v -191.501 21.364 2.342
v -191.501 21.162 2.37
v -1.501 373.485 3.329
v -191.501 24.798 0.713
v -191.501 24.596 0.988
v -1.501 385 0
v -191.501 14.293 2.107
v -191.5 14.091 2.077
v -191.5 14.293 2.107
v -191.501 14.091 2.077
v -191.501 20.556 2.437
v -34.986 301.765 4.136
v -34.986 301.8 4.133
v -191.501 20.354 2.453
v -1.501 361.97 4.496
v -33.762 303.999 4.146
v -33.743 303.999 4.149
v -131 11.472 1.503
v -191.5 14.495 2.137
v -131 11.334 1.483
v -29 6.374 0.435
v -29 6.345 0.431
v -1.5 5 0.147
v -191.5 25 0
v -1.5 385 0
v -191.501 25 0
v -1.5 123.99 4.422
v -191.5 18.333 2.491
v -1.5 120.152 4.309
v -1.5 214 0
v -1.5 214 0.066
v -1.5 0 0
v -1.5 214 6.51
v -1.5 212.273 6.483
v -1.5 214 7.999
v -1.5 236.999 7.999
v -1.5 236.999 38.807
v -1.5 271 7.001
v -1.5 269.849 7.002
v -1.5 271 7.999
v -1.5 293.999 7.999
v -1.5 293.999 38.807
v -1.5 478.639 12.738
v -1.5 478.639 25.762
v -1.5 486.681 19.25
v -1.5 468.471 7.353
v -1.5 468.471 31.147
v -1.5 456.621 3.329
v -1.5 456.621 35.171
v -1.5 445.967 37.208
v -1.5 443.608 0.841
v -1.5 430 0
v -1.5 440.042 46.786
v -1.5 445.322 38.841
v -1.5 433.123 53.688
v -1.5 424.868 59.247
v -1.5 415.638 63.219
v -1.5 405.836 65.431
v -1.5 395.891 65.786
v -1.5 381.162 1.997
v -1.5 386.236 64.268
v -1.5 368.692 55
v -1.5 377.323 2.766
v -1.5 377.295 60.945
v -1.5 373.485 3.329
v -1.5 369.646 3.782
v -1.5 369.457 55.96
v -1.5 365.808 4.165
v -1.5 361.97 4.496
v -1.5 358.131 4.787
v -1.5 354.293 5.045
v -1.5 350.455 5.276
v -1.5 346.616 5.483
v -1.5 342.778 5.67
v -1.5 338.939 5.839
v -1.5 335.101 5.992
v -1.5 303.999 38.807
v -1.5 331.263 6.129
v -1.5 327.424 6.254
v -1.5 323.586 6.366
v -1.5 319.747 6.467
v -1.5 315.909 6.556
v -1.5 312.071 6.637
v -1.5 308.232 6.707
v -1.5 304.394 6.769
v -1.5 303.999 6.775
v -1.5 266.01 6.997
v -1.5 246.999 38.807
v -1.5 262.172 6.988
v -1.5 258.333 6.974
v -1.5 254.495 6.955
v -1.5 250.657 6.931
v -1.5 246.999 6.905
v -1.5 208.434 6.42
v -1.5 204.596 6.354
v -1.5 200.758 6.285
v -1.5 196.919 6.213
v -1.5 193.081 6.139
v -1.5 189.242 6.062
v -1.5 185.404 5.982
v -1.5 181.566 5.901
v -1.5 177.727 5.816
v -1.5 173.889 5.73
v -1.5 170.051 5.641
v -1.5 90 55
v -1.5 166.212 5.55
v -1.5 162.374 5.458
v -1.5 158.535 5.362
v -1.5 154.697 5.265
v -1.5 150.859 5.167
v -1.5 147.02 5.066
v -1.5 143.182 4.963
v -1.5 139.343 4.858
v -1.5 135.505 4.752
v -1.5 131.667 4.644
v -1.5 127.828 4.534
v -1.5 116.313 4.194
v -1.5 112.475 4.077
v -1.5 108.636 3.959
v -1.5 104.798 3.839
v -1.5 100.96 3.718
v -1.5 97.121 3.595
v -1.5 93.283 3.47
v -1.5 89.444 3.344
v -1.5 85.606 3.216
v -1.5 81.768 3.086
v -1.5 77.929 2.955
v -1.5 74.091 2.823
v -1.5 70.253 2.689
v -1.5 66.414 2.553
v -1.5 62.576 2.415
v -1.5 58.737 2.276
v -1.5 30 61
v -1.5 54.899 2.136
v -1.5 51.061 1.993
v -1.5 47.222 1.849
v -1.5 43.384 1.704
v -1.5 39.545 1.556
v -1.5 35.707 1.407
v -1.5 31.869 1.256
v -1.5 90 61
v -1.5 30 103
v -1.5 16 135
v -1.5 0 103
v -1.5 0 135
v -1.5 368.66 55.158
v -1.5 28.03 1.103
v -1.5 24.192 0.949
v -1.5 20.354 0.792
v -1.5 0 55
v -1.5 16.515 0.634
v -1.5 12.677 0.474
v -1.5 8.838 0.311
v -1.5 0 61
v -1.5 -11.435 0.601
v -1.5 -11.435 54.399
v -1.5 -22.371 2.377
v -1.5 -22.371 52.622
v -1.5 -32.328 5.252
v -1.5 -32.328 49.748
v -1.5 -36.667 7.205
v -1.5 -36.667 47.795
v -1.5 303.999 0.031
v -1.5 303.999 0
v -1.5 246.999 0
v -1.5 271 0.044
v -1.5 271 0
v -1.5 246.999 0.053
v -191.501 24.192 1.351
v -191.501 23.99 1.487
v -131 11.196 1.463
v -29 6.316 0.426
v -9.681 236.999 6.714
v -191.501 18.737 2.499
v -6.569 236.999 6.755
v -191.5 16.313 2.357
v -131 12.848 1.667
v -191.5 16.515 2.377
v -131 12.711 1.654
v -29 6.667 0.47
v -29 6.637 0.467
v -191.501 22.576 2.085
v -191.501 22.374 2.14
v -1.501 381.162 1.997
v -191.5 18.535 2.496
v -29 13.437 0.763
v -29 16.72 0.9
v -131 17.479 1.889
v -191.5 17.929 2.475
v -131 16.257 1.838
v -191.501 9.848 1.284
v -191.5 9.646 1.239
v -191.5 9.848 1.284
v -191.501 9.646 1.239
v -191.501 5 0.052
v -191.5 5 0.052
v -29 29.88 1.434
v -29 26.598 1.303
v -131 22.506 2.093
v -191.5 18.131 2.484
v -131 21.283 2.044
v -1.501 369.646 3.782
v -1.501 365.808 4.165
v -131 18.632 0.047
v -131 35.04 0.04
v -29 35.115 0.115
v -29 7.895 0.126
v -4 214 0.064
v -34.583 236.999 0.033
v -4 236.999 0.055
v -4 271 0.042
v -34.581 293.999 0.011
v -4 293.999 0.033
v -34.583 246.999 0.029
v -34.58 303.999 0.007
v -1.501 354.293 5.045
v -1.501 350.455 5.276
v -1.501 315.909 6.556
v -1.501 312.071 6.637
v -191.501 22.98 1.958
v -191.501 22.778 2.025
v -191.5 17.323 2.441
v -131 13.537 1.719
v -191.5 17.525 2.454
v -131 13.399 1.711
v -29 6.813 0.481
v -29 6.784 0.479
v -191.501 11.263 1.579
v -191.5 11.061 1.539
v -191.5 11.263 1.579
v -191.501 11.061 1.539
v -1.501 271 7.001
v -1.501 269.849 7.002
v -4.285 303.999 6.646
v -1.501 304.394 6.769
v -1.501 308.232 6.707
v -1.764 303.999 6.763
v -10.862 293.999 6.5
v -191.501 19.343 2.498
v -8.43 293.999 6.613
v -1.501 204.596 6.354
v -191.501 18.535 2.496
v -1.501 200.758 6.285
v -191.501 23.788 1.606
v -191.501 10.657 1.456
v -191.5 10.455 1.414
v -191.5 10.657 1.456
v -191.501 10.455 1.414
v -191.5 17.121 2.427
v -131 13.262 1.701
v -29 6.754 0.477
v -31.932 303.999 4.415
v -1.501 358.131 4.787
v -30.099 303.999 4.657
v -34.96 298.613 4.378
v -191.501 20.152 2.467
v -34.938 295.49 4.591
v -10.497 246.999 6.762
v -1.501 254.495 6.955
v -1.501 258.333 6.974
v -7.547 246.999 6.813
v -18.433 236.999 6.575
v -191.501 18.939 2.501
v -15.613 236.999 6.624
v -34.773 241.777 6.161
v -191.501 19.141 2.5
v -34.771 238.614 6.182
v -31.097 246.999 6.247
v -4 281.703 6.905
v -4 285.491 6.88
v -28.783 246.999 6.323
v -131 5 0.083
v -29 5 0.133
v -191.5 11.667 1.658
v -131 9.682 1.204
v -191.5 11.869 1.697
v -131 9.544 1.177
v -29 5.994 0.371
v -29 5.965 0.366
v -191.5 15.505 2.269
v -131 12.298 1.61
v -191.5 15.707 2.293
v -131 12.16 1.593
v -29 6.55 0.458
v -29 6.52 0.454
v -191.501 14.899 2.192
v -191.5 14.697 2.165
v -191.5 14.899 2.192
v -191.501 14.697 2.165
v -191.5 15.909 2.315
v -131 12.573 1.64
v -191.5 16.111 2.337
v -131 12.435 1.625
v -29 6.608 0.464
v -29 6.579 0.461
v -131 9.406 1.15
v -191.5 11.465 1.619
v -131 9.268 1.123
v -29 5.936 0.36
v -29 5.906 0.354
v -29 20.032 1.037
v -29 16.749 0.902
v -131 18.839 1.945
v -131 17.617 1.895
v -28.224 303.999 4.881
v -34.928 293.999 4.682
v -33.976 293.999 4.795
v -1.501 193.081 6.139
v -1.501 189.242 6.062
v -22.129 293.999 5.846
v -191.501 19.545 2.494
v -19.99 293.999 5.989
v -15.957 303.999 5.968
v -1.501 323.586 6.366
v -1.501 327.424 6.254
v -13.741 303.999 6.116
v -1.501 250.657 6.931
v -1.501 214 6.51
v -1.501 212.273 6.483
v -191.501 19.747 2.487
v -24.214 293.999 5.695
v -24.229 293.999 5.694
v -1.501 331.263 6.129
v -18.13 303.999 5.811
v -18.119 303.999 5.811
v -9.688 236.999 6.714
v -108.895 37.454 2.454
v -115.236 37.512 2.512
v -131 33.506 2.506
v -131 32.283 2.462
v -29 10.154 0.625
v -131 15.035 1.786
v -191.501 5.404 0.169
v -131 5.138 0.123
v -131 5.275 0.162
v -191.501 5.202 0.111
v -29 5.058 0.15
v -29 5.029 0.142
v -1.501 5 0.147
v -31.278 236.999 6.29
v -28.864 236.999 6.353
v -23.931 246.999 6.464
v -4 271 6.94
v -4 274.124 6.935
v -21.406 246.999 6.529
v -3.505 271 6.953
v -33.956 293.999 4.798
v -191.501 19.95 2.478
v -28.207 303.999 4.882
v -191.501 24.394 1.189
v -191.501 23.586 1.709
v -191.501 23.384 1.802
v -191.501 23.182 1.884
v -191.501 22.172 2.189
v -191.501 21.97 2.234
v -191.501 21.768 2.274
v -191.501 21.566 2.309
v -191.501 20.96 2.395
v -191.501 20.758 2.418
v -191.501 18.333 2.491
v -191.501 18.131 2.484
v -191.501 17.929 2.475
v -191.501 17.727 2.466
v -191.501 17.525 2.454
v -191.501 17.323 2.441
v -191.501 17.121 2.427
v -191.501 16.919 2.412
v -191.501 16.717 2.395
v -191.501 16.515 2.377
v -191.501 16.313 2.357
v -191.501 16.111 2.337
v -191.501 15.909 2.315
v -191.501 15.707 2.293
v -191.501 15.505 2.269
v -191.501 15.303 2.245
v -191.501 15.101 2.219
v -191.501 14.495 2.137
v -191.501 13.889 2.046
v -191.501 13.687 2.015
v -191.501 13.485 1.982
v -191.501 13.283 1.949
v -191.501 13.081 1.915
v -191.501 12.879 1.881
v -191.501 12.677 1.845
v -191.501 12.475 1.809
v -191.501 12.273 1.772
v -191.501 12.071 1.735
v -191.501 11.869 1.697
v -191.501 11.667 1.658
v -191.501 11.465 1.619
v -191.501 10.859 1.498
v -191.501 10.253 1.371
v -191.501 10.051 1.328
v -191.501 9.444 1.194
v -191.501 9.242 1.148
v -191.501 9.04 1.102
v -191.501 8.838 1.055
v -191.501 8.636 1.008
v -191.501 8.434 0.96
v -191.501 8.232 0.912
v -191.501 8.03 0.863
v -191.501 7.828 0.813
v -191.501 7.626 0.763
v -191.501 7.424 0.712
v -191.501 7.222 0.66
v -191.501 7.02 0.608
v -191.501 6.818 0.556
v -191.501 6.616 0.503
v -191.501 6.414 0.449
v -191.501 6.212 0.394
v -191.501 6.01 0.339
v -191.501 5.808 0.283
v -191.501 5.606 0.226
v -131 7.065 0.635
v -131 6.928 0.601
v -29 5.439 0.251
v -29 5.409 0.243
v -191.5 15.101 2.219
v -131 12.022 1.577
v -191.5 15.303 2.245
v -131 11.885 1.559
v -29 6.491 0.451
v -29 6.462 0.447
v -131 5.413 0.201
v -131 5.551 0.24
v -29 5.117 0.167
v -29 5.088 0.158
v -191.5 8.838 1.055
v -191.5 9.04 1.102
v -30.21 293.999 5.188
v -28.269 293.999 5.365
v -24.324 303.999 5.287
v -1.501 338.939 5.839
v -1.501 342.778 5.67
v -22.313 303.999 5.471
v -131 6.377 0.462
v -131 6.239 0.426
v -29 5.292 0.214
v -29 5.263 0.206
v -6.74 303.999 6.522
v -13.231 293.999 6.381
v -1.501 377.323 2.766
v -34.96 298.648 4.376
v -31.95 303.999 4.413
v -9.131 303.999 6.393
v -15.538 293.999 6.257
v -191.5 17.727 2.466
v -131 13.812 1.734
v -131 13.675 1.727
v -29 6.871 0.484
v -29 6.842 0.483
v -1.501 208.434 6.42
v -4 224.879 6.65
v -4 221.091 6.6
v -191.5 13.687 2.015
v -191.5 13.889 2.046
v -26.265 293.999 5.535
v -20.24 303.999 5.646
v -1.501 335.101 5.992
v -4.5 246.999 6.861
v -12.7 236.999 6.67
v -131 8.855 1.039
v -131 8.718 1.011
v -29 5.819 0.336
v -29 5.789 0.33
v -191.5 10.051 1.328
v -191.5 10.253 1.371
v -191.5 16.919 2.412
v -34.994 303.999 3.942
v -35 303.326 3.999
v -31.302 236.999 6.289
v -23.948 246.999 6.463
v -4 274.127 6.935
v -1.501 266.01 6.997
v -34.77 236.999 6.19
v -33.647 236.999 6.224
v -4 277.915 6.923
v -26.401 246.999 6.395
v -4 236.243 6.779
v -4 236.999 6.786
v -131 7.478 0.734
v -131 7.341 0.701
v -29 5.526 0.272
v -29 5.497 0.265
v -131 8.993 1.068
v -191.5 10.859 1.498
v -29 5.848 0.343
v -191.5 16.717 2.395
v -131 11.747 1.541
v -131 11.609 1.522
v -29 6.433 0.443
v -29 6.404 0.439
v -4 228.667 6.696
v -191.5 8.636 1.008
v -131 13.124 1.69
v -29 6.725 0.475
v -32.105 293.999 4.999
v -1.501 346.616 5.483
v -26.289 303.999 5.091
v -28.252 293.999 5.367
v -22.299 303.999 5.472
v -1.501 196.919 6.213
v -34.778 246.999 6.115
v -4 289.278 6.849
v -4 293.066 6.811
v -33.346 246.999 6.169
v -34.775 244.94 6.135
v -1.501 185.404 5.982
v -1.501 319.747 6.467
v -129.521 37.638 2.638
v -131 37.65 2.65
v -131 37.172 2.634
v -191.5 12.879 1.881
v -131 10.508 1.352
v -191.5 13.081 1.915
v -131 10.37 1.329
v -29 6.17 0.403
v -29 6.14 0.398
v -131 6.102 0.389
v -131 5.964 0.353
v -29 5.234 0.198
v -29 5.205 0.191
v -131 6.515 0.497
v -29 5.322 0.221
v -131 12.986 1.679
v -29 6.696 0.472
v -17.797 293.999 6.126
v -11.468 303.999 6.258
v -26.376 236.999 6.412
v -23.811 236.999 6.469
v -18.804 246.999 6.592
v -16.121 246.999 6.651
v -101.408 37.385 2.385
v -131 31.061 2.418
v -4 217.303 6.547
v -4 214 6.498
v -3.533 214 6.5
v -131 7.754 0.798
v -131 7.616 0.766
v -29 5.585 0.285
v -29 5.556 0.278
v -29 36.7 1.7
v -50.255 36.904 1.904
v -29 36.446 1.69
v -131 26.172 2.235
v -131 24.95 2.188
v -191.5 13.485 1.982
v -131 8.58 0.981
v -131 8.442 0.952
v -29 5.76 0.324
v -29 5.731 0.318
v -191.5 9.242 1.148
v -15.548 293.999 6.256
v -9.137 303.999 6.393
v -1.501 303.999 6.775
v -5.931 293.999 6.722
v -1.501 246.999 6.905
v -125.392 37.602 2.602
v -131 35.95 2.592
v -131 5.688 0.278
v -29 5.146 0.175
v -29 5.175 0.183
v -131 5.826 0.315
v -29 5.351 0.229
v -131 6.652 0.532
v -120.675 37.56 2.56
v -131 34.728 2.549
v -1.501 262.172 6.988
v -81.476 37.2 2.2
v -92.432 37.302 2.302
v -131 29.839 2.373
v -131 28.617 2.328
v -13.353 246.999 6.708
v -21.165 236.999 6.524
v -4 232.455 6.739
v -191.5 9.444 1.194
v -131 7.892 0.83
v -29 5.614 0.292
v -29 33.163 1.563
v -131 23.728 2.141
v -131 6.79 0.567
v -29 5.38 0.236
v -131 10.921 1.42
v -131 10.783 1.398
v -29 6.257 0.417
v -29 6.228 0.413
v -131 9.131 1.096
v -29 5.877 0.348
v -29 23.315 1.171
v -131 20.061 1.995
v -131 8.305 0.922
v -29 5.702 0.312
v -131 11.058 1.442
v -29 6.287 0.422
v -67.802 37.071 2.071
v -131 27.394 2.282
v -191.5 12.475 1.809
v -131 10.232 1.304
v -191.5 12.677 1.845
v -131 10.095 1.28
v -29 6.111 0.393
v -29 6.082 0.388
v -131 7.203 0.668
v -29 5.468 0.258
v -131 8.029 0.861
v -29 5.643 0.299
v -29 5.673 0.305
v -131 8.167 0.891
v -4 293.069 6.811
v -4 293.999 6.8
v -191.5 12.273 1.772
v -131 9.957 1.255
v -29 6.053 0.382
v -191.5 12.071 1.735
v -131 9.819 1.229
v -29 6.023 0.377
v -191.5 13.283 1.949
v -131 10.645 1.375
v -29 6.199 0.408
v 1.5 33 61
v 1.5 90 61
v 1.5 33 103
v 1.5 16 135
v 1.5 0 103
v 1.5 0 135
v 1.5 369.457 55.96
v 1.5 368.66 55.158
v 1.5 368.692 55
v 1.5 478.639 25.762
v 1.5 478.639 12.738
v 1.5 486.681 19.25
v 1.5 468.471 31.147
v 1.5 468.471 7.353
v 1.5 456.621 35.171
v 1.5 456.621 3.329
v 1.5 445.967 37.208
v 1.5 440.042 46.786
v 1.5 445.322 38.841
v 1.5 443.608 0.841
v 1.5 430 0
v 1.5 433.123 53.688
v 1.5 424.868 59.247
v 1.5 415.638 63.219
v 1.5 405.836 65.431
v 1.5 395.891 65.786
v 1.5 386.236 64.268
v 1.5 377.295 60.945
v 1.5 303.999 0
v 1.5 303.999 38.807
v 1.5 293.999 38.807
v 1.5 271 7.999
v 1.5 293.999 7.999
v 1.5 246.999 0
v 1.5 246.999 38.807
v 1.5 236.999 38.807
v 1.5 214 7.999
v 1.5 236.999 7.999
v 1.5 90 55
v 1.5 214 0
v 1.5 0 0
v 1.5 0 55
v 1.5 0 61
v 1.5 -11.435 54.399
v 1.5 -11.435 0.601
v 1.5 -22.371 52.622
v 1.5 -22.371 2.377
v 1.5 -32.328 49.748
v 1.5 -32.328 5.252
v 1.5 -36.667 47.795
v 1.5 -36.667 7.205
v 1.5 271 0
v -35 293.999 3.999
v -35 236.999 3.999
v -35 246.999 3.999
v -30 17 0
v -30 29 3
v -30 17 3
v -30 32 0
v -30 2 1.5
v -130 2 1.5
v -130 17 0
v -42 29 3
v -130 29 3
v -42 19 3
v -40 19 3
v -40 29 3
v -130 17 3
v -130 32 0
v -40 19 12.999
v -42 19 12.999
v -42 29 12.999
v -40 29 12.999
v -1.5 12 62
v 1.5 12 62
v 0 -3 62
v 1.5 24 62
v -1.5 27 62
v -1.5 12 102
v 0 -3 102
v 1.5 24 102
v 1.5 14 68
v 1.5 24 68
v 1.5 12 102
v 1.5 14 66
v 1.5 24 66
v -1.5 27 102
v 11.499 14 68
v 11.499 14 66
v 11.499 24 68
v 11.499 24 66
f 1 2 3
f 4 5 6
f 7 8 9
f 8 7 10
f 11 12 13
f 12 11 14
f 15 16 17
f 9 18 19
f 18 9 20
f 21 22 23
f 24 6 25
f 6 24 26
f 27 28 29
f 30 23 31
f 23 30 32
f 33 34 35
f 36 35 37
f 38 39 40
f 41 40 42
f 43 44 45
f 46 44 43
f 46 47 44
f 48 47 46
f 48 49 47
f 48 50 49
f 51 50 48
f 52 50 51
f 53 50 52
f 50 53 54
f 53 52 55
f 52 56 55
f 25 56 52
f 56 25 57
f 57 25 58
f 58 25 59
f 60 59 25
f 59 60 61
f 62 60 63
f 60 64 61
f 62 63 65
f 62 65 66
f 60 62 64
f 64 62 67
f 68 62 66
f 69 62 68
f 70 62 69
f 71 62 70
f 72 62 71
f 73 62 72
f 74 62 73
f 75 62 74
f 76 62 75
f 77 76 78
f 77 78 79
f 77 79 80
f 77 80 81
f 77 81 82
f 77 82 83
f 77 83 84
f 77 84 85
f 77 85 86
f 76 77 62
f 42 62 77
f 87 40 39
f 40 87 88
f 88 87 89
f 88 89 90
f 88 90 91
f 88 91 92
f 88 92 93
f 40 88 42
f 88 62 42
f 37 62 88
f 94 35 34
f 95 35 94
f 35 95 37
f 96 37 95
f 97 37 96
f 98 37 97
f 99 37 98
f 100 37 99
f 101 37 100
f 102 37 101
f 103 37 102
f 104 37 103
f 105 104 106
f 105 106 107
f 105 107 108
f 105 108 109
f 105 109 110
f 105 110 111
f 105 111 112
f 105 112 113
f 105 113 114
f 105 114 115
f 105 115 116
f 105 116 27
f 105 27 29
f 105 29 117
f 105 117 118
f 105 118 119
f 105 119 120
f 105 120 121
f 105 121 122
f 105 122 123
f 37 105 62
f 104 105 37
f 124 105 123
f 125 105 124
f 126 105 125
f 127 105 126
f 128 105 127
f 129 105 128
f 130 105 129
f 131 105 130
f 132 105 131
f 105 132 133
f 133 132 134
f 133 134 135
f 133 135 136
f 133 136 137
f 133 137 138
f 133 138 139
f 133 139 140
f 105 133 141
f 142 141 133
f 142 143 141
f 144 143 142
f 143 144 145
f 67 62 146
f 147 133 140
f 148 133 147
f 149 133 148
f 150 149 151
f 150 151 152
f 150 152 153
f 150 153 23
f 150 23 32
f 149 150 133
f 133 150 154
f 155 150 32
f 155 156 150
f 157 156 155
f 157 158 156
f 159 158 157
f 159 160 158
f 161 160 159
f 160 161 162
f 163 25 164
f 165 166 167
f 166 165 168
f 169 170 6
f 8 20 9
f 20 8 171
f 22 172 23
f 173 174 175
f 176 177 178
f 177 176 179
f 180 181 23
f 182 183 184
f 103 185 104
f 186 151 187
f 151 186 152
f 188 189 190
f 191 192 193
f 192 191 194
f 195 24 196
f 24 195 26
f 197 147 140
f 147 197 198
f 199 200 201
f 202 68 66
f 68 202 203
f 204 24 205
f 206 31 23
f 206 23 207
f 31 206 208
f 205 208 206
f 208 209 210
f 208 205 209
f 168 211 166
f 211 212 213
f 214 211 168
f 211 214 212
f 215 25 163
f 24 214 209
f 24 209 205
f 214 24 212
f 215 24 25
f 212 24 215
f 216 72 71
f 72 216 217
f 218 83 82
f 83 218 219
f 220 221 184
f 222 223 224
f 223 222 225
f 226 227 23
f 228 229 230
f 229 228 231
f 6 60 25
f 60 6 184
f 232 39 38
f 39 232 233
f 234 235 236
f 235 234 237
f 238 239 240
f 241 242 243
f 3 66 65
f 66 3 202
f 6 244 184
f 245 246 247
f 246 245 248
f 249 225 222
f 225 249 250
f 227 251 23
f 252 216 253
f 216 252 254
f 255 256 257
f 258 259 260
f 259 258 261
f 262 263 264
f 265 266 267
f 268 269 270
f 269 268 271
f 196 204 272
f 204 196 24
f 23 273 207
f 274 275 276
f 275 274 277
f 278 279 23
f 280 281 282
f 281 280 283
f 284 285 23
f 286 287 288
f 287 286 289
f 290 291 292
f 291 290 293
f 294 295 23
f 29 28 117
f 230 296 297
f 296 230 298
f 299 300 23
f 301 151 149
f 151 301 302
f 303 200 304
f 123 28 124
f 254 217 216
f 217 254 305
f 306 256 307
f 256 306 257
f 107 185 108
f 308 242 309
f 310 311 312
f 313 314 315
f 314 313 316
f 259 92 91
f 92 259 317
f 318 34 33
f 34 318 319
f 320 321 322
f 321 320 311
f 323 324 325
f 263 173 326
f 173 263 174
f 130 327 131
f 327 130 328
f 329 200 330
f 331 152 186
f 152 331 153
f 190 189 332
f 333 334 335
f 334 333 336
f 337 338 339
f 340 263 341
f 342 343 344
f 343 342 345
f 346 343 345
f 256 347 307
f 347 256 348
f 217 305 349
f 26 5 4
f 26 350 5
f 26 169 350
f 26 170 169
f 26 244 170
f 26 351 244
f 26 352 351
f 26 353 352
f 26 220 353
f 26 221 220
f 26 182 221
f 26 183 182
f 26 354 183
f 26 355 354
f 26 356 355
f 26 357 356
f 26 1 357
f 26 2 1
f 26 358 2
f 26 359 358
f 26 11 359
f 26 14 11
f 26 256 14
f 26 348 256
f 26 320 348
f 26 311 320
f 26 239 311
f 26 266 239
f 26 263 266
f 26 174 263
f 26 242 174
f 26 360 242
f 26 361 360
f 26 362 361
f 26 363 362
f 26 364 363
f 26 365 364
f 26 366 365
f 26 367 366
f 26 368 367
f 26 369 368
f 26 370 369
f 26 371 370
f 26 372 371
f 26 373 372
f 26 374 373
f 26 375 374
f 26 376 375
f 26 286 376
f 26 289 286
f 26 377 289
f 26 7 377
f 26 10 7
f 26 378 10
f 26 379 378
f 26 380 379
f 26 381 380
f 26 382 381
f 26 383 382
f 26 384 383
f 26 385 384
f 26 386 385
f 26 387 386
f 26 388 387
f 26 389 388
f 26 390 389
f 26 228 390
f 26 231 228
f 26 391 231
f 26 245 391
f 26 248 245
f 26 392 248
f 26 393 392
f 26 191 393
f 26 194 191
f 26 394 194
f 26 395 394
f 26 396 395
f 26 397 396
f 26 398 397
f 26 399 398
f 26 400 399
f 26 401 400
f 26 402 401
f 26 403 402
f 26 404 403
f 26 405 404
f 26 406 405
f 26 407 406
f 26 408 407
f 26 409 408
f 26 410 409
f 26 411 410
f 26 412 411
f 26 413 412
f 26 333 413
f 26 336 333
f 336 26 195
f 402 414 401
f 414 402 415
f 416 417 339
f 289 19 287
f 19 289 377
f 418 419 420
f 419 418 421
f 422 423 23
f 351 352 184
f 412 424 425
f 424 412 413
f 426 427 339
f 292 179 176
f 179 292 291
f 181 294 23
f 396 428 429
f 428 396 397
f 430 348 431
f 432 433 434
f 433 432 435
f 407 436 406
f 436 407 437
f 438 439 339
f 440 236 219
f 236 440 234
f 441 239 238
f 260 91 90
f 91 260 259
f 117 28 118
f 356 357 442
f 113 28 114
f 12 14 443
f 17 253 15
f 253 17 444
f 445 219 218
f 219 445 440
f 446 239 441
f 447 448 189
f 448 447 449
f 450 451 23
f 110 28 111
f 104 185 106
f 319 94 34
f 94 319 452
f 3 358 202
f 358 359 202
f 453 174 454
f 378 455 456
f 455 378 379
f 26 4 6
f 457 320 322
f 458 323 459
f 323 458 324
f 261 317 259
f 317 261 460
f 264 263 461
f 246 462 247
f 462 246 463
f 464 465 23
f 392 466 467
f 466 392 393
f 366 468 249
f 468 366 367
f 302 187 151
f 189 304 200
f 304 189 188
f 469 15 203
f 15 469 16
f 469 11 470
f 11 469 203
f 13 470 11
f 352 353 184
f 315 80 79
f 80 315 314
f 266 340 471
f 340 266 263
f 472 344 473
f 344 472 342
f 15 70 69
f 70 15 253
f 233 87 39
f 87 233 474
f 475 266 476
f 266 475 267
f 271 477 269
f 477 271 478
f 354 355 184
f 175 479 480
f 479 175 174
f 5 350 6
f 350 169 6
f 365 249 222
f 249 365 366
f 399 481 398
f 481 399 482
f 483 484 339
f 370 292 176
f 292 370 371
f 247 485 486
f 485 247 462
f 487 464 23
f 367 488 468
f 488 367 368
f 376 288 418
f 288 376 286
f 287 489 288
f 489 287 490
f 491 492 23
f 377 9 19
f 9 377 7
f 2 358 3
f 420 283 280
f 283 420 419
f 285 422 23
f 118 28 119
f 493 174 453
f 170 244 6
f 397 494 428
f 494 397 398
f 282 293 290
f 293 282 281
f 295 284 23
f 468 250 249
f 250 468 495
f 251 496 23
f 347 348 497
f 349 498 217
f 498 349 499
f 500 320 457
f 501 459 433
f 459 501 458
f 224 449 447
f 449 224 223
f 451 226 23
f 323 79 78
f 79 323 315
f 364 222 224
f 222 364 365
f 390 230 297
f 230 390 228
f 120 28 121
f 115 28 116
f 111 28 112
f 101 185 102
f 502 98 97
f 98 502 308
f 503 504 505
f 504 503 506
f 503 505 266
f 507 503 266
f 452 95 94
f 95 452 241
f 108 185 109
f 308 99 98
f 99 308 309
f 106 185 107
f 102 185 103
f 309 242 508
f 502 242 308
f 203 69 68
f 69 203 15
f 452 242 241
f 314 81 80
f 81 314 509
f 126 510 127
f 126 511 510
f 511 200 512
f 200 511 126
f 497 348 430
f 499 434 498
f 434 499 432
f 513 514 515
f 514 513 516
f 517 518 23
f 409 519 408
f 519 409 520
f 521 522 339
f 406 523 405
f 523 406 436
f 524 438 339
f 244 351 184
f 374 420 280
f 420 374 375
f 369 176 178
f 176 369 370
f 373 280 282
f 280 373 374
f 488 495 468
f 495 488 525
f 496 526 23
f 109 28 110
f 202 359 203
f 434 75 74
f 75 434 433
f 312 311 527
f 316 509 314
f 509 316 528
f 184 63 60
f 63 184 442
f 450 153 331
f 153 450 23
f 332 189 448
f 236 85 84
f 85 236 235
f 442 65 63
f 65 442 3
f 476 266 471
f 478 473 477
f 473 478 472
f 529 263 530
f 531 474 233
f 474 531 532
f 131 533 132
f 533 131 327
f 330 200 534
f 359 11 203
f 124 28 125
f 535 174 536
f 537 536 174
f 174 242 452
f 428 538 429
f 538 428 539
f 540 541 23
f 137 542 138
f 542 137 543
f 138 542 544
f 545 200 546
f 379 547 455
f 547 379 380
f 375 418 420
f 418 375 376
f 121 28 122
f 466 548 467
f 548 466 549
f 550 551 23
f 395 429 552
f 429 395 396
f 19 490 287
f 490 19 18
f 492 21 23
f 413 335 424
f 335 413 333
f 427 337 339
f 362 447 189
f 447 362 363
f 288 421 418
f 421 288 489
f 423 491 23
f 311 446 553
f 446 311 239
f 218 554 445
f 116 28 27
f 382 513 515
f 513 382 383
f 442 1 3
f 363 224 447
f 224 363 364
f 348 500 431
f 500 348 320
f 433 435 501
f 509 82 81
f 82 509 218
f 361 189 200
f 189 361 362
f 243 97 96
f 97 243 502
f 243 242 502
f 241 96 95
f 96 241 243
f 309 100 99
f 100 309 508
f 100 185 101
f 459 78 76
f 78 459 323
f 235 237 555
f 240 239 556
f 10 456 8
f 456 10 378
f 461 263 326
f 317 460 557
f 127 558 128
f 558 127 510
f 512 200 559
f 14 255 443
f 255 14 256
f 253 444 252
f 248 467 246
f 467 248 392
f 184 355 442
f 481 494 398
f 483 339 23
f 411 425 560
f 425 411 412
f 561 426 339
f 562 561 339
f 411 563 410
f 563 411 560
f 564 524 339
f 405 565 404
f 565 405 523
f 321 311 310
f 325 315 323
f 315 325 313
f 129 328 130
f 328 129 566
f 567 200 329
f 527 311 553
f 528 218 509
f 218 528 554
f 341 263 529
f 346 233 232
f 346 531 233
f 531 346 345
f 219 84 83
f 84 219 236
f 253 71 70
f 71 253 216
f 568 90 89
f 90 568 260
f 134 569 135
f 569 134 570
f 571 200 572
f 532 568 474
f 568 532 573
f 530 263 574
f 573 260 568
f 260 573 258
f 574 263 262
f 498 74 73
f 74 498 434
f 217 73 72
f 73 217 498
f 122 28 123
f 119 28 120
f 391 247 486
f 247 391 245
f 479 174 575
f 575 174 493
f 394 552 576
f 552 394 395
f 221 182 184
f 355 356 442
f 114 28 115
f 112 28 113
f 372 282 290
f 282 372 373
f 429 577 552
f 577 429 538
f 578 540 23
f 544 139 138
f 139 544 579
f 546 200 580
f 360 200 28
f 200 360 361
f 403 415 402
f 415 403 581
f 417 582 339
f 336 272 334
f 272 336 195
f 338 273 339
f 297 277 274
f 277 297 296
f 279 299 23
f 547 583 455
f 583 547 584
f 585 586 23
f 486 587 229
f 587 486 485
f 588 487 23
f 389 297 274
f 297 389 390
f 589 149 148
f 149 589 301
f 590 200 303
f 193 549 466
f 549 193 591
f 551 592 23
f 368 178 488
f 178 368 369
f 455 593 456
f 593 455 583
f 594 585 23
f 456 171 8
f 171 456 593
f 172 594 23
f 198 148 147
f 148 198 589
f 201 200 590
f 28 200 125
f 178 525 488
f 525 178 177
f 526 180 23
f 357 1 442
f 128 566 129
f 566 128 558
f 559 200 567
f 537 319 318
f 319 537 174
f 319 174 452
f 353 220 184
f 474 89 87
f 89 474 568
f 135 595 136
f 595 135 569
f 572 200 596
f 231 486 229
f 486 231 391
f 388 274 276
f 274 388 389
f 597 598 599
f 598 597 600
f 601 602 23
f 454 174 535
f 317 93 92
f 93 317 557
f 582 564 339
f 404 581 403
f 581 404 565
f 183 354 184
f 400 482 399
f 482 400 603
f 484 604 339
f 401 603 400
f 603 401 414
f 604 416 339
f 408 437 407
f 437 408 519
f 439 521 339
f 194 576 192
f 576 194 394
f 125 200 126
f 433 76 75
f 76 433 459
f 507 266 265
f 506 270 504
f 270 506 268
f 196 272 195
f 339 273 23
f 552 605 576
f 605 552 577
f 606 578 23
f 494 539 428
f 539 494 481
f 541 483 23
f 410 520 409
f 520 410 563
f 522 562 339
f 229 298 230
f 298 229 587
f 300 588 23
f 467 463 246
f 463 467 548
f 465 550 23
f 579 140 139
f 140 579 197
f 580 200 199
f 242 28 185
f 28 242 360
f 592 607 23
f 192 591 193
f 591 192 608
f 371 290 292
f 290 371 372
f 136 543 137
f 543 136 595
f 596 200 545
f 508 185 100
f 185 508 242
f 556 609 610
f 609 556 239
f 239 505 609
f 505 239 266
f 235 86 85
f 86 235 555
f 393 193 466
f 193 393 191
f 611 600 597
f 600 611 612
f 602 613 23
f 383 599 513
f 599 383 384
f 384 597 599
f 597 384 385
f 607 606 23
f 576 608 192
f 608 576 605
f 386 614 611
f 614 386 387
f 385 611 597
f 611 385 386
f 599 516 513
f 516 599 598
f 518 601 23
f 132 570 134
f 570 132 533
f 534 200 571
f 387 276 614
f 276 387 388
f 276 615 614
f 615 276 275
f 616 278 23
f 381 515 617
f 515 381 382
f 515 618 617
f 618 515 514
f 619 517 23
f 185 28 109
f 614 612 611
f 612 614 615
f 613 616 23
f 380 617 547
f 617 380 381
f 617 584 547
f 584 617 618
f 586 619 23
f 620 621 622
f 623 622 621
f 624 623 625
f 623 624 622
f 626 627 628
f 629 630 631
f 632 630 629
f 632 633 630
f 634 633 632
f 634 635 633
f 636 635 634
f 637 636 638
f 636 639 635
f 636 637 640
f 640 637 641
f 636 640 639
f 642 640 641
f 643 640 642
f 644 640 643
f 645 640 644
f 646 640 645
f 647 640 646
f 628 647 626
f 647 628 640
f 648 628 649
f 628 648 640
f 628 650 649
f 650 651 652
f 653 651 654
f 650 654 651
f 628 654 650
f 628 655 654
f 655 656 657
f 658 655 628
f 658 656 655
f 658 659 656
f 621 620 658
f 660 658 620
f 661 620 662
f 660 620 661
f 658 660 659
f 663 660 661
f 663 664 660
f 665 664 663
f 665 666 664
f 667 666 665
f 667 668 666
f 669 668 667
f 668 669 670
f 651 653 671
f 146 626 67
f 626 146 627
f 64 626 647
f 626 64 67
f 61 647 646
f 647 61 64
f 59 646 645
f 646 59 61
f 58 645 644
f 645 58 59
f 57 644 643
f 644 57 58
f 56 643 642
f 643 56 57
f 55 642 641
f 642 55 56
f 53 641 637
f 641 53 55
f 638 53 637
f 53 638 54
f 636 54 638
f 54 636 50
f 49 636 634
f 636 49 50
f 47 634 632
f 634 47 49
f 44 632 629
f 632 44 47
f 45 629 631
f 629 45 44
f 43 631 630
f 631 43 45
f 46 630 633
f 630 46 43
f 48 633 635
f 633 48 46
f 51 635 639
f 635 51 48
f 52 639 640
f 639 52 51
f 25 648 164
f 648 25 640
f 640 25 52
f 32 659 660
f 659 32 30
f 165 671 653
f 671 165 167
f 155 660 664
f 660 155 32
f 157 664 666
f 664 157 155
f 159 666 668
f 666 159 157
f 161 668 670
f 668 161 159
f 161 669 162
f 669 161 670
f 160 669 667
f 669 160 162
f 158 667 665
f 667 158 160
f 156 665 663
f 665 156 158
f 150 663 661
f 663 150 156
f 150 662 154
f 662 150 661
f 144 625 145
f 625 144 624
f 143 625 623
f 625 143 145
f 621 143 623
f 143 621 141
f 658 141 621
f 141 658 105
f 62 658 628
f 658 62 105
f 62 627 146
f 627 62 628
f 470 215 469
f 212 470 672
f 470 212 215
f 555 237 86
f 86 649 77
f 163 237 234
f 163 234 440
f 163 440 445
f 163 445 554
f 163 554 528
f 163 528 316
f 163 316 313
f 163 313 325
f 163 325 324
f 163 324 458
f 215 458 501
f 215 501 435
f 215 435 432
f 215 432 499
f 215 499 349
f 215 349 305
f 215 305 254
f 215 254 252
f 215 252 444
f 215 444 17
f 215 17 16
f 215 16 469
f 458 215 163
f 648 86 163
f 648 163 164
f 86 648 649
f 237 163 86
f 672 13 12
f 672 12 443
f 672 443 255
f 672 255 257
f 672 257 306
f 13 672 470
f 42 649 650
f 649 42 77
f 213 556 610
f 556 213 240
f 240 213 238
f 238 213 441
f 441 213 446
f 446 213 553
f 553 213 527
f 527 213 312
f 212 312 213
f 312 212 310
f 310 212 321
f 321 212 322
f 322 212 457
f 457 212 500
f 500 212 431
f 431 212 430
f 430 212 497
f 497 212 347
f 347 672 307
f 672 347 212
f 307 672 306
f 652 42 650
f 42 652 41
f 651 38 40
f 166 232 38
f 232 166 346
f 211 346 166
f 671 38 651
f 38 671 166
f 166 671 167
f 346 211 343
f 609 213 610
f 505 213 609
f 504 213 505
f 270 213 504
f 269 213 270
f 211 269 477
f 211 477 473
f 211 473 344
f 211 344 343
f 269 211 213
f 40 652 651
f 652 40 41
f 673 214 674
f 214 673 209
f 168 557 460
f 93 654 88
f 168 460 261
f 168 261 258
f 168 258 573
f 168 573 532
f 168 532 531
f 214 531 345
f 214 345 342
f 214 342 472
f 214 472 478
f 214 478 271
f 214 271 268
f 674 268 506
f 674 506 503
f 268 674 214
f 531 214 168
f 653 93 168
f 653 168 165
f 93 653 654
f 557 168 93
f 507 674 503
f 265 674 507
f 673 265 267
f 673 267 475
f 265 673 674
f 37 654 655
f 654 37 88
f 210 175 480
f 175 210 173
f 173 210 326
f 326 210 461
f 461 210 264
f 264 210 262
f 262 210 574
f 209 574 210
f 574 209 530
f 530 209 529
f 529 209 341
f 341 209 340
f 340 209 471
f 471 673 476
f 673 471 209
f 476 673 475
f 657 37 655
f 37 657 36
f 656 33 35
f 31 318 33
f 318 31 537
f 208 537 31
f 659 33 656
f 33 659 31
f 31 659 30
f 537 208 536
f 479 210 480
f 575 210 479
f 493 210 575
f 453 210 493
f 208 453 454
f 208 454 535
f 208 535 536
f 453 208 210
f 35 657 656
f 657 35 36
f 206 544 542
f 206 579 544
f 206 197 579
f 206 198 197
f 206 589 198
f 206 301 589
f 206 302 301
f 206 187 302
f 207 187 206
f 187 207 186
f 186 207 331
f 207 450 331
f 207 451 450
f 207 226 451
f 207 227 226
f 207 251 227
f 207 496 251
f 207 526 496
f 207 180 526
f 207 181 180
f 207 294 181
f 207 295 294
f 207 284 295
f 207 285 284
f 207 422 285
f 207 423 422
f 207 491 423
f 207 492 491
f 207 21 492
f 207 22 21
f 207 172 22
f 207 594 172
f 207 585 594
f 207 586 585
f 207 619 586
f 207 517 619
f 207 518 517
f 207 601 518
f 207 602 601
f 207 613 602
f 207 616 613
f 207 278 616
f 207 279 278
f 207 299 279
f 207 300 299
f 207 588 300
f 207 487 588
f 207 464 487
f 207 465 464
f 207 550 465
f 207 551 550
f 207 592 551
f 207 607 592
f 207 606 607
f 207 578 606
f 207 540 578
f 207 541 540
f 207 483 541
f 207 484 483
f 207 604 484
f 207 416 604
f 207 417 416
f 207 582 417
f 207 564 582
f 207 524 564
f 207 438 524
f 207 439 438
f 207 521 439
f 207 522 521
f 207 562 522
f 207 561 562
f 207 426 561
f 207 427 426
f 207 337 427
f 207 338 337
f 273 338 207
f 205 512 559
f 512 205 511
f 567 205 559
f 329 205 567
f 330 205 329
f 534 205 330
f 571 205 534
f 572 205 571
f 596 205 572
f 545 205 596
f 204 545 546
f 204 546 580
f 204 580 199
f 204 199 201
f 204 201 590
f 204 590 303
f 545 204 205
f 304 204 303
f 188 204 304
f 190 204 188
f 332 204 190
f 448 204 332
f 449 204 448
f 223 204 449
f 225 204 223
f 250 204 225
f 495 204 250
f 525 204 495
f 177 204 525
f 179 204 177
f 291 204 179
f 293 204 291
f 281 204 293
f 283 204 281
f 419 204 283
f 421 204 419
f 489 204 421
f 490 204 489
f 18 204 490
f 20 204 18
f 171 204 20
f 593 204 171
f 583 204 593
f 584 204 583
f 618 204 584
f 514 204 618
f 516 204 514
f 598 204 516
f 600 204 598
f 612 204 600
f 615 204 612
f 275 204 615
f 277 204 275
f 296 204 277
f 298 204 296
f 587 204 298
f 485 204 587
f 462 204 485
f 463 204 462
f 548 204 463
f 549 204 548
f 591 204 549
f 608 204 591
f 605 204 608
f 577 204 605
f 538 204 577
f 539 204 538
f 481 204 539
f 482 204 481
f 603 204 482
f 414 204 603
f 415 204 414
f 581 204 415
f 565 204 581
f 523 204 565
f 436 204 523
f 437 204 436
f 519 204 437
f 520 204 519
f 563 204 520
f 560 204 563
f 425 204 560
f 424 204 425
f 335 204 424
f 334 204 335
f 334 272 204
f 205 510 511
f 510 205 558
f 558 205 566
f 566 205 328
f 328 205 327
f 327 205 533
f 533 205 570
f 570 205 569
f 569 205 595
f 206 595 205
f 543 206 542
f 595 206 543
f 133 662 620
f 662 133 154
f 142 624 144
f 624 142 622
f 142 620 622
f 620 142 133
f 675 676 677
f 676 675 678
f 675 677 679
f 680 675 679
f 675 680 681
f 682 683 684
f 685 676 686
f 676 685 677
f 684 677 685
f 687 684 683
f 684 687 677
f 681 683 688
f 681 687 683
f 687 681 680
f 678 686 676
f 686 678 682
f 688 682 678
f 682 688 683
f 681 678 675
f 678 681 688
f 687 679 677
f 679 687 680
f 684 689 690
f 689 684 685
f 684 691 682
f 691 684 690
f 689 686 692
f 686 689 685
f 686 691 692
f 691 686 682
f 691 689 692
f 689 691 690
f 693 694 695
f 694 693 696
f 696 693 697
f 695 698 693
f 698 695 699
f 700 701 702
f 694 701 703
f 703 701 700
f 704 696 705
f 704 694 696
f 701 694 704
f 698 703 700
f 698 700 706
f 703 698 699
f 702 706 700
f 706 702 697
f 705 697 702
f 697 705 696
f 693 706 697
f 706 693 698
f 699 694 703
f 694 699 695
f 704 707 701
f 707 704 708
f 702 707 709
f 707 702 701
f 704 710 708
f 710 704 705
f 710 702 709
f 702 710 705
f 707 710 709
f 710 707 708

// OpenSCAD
module motorCutOut( length, width, rad, spac ) {
	translate([0,0,length+spac/2.0 - e])
	cylinder(h=spac, r=rad, center=true);
	translate([0,0,length/2.0])
	cube(size=[width,width,length], center=true);
}

// x goes from 0 to 1, t determines thickness
function naca_half_thickness(x,t) = 5*t*(0.2969*sqrt(x) - 0.1260*x - 0.3516*pow(x,2) + 0.2843*pow(x,3) - 0.1015*pow(x,4));
function naca_pts(t,n,s=1) = [ for (x=[0:1/(n-1):1]) [s*x, s*naca_half_thickness(x,t)]];
module wing(rootLength,root_h, tipLength,tip_h, span){

	root_t = 2*root_h / rootLength;
	tip_t = 2*tip_h / tipLength;

	nPtsRoot = 100;
	nPtsTip = 100;
	
	hull(){
		// Root cross section
		linear_extrude(height=e){
			polygon(naca_pts(root_t,nPtsRoot,rootLength));
		}

		// Tip cross section
		translate([rootLength-tipLength,0,span])
		linear_extrude(height=e){
			polygon(naca_pts(tip_t,nPtsTip,tipLength));
		}
	}
}



//module Mirage2000_body(s,l,thickness) {
//	
//	pts = [];
//	
//	linear_extrude(thickness){
//		polygon(pts);
//	}
//}




module Mirage2000_body(s,l,thickness) {
	
	th = 80;
	tw = 90;
	
	linear_extrude(thickness){
		// Nose
		translate([0.35*s,l,0])
		intersection(){
			translate([0.35*s,0,0])
			scale([1,1.7,1])
			circle(r=.70*s);
			translate([-0.35*s,0,0])
			scale([1,1.7,1])
			circle(r=.70*s);
		}
		
		// fuselage
		square([s,l]);
		
		// canopy
		translate([0.75*s,0.95*l,0])
		rotate([0,0,18])
		intersection(){
			translate([0.35*s,0,0])
			scale([1,1.25,1])
			circle(r=0.70*s);
			translate([-0.35*s,0,0])
			scale([1.1,1.25,1])
			circle(r=0.70*s);
		}
		
		// Exhaust
		difference(){
			translate([s/2,0,0])
			scale([1,2,1])
			circle(r=s/2);
			
			translate([0,-(s+s/1.5),0])
			square([s,s]);
		}
		
		// Tail
		translate([s,0,0])
		difference(){
			square([th,tw]);
			translate([1.2*th,0,0])
			rotate([0,0,45])
			square([th,2*th]);
		}
	}
}


module controlSurface(l,th,d){
	pts = [[0,0],[th,th],[d/2,th],[d,th/2],[d/2,0]];
	
	linear_extrude(l){
		polygon(pts);
	}

	translate([th,th-e,l/10])
	cube(size=[10,10,2]);
}

module controlSurfaceCutout(l,th,d,h=50){
	pts = [[-th,th],[0,0],[0,-h/2],[d,-h/2],[d,h/2],[-th,h/2]];
	
	linear_extrude(l){
		polygon(pts);
	}
}


// Fudge factor
e = 0.001;

// Wing parameters
wingLength = 380.0;
wingRootHeight = 7;

wingTipLength = 20.0;
wingTipHeight = 2.5;

wingSpan = wingLength / 2.0;

// Motor cutout specifications
motor_rad = 4;
motor_length = 23.0;
prop_rad = 35.0;
prop_thick = 10.0;

motor1_pos = 0.7*wingLength;
motor2_pos = 0.55*wingLength;

// Aileron and aileron cut out specifications
aileronStart = 30;
aileronLength = 100;
aileronDepth = 30;
aileronThickness = 3;

// rudder and cut out specs
rudderStart = 7;
rudderLength = 40;
rudderDepth = 30;
rudderThickness = 3;

// control surface wiggle room
wiggleRoom = 1;

// Body specifications
fuselageLength = 430.0;
fuselageH = 55.0;
fuselageThickness = 3.0;

wingPos = 5.0;




difference() {

	union(){
		translate([-fuselageThickness/2,wingLength + wingPos,0])
		rotate([90,0,-90])
		wing( wingLength, wingRootHeight, wingTipLength, wingTipHeight, wingSpan );

		translate([fuselageThickness/2,0,0])
		rotate([0,-90,0])
		Mirage2000_body(fuselageH,fuselageLength,fuselageThickness);

	}

	translate([0,motor1_pos+wingPos,motor_rad-e])
	rotate([-90,0,0])
	motorCutOut( motor_length, 2*motor_rad, prop_rad, prop_thick );

	translate([0,motor2_pos+wingPos,motor_rad-e])
	rotate([-90,0,0])
	motorCutOut( motor_length, 2*motor_rad, prop_rad, prop_thick );
	
	// aileron cut out
	translate([-aileronStart+wiggleRoom,wingPos+aileronDepth,0])
	rotate([90,0,-90])
	controlSurfaceCutout( aileronLength+2*wiggleRoom, 2*aileronThickness, 1.25*aileronDepth );
	
	// rudder cut out
	translate([-fuselageThickness/2,rudderDepth,rudderStart+fuselageH -wiggleRoom])
	rotate([0,0,-90])
	controlSurfaceCutout( rudderLength+2*wiggleRoom, 2*rudderThickness, 1.25*rudderDepth );

}

translate([-aileronStart,wingPos+aileronDepth -3,0])
rotate([90,0,-90])
controlSurface( aileronLength, aileronThickness, aileronDepth );

translate([-fuselageThickness/2, rudderDepth -3, rudderStart+fuselageH])
rotate([0,0,-90])
controlSurface( rudderLength, rudderThickness, rudderDepth );
